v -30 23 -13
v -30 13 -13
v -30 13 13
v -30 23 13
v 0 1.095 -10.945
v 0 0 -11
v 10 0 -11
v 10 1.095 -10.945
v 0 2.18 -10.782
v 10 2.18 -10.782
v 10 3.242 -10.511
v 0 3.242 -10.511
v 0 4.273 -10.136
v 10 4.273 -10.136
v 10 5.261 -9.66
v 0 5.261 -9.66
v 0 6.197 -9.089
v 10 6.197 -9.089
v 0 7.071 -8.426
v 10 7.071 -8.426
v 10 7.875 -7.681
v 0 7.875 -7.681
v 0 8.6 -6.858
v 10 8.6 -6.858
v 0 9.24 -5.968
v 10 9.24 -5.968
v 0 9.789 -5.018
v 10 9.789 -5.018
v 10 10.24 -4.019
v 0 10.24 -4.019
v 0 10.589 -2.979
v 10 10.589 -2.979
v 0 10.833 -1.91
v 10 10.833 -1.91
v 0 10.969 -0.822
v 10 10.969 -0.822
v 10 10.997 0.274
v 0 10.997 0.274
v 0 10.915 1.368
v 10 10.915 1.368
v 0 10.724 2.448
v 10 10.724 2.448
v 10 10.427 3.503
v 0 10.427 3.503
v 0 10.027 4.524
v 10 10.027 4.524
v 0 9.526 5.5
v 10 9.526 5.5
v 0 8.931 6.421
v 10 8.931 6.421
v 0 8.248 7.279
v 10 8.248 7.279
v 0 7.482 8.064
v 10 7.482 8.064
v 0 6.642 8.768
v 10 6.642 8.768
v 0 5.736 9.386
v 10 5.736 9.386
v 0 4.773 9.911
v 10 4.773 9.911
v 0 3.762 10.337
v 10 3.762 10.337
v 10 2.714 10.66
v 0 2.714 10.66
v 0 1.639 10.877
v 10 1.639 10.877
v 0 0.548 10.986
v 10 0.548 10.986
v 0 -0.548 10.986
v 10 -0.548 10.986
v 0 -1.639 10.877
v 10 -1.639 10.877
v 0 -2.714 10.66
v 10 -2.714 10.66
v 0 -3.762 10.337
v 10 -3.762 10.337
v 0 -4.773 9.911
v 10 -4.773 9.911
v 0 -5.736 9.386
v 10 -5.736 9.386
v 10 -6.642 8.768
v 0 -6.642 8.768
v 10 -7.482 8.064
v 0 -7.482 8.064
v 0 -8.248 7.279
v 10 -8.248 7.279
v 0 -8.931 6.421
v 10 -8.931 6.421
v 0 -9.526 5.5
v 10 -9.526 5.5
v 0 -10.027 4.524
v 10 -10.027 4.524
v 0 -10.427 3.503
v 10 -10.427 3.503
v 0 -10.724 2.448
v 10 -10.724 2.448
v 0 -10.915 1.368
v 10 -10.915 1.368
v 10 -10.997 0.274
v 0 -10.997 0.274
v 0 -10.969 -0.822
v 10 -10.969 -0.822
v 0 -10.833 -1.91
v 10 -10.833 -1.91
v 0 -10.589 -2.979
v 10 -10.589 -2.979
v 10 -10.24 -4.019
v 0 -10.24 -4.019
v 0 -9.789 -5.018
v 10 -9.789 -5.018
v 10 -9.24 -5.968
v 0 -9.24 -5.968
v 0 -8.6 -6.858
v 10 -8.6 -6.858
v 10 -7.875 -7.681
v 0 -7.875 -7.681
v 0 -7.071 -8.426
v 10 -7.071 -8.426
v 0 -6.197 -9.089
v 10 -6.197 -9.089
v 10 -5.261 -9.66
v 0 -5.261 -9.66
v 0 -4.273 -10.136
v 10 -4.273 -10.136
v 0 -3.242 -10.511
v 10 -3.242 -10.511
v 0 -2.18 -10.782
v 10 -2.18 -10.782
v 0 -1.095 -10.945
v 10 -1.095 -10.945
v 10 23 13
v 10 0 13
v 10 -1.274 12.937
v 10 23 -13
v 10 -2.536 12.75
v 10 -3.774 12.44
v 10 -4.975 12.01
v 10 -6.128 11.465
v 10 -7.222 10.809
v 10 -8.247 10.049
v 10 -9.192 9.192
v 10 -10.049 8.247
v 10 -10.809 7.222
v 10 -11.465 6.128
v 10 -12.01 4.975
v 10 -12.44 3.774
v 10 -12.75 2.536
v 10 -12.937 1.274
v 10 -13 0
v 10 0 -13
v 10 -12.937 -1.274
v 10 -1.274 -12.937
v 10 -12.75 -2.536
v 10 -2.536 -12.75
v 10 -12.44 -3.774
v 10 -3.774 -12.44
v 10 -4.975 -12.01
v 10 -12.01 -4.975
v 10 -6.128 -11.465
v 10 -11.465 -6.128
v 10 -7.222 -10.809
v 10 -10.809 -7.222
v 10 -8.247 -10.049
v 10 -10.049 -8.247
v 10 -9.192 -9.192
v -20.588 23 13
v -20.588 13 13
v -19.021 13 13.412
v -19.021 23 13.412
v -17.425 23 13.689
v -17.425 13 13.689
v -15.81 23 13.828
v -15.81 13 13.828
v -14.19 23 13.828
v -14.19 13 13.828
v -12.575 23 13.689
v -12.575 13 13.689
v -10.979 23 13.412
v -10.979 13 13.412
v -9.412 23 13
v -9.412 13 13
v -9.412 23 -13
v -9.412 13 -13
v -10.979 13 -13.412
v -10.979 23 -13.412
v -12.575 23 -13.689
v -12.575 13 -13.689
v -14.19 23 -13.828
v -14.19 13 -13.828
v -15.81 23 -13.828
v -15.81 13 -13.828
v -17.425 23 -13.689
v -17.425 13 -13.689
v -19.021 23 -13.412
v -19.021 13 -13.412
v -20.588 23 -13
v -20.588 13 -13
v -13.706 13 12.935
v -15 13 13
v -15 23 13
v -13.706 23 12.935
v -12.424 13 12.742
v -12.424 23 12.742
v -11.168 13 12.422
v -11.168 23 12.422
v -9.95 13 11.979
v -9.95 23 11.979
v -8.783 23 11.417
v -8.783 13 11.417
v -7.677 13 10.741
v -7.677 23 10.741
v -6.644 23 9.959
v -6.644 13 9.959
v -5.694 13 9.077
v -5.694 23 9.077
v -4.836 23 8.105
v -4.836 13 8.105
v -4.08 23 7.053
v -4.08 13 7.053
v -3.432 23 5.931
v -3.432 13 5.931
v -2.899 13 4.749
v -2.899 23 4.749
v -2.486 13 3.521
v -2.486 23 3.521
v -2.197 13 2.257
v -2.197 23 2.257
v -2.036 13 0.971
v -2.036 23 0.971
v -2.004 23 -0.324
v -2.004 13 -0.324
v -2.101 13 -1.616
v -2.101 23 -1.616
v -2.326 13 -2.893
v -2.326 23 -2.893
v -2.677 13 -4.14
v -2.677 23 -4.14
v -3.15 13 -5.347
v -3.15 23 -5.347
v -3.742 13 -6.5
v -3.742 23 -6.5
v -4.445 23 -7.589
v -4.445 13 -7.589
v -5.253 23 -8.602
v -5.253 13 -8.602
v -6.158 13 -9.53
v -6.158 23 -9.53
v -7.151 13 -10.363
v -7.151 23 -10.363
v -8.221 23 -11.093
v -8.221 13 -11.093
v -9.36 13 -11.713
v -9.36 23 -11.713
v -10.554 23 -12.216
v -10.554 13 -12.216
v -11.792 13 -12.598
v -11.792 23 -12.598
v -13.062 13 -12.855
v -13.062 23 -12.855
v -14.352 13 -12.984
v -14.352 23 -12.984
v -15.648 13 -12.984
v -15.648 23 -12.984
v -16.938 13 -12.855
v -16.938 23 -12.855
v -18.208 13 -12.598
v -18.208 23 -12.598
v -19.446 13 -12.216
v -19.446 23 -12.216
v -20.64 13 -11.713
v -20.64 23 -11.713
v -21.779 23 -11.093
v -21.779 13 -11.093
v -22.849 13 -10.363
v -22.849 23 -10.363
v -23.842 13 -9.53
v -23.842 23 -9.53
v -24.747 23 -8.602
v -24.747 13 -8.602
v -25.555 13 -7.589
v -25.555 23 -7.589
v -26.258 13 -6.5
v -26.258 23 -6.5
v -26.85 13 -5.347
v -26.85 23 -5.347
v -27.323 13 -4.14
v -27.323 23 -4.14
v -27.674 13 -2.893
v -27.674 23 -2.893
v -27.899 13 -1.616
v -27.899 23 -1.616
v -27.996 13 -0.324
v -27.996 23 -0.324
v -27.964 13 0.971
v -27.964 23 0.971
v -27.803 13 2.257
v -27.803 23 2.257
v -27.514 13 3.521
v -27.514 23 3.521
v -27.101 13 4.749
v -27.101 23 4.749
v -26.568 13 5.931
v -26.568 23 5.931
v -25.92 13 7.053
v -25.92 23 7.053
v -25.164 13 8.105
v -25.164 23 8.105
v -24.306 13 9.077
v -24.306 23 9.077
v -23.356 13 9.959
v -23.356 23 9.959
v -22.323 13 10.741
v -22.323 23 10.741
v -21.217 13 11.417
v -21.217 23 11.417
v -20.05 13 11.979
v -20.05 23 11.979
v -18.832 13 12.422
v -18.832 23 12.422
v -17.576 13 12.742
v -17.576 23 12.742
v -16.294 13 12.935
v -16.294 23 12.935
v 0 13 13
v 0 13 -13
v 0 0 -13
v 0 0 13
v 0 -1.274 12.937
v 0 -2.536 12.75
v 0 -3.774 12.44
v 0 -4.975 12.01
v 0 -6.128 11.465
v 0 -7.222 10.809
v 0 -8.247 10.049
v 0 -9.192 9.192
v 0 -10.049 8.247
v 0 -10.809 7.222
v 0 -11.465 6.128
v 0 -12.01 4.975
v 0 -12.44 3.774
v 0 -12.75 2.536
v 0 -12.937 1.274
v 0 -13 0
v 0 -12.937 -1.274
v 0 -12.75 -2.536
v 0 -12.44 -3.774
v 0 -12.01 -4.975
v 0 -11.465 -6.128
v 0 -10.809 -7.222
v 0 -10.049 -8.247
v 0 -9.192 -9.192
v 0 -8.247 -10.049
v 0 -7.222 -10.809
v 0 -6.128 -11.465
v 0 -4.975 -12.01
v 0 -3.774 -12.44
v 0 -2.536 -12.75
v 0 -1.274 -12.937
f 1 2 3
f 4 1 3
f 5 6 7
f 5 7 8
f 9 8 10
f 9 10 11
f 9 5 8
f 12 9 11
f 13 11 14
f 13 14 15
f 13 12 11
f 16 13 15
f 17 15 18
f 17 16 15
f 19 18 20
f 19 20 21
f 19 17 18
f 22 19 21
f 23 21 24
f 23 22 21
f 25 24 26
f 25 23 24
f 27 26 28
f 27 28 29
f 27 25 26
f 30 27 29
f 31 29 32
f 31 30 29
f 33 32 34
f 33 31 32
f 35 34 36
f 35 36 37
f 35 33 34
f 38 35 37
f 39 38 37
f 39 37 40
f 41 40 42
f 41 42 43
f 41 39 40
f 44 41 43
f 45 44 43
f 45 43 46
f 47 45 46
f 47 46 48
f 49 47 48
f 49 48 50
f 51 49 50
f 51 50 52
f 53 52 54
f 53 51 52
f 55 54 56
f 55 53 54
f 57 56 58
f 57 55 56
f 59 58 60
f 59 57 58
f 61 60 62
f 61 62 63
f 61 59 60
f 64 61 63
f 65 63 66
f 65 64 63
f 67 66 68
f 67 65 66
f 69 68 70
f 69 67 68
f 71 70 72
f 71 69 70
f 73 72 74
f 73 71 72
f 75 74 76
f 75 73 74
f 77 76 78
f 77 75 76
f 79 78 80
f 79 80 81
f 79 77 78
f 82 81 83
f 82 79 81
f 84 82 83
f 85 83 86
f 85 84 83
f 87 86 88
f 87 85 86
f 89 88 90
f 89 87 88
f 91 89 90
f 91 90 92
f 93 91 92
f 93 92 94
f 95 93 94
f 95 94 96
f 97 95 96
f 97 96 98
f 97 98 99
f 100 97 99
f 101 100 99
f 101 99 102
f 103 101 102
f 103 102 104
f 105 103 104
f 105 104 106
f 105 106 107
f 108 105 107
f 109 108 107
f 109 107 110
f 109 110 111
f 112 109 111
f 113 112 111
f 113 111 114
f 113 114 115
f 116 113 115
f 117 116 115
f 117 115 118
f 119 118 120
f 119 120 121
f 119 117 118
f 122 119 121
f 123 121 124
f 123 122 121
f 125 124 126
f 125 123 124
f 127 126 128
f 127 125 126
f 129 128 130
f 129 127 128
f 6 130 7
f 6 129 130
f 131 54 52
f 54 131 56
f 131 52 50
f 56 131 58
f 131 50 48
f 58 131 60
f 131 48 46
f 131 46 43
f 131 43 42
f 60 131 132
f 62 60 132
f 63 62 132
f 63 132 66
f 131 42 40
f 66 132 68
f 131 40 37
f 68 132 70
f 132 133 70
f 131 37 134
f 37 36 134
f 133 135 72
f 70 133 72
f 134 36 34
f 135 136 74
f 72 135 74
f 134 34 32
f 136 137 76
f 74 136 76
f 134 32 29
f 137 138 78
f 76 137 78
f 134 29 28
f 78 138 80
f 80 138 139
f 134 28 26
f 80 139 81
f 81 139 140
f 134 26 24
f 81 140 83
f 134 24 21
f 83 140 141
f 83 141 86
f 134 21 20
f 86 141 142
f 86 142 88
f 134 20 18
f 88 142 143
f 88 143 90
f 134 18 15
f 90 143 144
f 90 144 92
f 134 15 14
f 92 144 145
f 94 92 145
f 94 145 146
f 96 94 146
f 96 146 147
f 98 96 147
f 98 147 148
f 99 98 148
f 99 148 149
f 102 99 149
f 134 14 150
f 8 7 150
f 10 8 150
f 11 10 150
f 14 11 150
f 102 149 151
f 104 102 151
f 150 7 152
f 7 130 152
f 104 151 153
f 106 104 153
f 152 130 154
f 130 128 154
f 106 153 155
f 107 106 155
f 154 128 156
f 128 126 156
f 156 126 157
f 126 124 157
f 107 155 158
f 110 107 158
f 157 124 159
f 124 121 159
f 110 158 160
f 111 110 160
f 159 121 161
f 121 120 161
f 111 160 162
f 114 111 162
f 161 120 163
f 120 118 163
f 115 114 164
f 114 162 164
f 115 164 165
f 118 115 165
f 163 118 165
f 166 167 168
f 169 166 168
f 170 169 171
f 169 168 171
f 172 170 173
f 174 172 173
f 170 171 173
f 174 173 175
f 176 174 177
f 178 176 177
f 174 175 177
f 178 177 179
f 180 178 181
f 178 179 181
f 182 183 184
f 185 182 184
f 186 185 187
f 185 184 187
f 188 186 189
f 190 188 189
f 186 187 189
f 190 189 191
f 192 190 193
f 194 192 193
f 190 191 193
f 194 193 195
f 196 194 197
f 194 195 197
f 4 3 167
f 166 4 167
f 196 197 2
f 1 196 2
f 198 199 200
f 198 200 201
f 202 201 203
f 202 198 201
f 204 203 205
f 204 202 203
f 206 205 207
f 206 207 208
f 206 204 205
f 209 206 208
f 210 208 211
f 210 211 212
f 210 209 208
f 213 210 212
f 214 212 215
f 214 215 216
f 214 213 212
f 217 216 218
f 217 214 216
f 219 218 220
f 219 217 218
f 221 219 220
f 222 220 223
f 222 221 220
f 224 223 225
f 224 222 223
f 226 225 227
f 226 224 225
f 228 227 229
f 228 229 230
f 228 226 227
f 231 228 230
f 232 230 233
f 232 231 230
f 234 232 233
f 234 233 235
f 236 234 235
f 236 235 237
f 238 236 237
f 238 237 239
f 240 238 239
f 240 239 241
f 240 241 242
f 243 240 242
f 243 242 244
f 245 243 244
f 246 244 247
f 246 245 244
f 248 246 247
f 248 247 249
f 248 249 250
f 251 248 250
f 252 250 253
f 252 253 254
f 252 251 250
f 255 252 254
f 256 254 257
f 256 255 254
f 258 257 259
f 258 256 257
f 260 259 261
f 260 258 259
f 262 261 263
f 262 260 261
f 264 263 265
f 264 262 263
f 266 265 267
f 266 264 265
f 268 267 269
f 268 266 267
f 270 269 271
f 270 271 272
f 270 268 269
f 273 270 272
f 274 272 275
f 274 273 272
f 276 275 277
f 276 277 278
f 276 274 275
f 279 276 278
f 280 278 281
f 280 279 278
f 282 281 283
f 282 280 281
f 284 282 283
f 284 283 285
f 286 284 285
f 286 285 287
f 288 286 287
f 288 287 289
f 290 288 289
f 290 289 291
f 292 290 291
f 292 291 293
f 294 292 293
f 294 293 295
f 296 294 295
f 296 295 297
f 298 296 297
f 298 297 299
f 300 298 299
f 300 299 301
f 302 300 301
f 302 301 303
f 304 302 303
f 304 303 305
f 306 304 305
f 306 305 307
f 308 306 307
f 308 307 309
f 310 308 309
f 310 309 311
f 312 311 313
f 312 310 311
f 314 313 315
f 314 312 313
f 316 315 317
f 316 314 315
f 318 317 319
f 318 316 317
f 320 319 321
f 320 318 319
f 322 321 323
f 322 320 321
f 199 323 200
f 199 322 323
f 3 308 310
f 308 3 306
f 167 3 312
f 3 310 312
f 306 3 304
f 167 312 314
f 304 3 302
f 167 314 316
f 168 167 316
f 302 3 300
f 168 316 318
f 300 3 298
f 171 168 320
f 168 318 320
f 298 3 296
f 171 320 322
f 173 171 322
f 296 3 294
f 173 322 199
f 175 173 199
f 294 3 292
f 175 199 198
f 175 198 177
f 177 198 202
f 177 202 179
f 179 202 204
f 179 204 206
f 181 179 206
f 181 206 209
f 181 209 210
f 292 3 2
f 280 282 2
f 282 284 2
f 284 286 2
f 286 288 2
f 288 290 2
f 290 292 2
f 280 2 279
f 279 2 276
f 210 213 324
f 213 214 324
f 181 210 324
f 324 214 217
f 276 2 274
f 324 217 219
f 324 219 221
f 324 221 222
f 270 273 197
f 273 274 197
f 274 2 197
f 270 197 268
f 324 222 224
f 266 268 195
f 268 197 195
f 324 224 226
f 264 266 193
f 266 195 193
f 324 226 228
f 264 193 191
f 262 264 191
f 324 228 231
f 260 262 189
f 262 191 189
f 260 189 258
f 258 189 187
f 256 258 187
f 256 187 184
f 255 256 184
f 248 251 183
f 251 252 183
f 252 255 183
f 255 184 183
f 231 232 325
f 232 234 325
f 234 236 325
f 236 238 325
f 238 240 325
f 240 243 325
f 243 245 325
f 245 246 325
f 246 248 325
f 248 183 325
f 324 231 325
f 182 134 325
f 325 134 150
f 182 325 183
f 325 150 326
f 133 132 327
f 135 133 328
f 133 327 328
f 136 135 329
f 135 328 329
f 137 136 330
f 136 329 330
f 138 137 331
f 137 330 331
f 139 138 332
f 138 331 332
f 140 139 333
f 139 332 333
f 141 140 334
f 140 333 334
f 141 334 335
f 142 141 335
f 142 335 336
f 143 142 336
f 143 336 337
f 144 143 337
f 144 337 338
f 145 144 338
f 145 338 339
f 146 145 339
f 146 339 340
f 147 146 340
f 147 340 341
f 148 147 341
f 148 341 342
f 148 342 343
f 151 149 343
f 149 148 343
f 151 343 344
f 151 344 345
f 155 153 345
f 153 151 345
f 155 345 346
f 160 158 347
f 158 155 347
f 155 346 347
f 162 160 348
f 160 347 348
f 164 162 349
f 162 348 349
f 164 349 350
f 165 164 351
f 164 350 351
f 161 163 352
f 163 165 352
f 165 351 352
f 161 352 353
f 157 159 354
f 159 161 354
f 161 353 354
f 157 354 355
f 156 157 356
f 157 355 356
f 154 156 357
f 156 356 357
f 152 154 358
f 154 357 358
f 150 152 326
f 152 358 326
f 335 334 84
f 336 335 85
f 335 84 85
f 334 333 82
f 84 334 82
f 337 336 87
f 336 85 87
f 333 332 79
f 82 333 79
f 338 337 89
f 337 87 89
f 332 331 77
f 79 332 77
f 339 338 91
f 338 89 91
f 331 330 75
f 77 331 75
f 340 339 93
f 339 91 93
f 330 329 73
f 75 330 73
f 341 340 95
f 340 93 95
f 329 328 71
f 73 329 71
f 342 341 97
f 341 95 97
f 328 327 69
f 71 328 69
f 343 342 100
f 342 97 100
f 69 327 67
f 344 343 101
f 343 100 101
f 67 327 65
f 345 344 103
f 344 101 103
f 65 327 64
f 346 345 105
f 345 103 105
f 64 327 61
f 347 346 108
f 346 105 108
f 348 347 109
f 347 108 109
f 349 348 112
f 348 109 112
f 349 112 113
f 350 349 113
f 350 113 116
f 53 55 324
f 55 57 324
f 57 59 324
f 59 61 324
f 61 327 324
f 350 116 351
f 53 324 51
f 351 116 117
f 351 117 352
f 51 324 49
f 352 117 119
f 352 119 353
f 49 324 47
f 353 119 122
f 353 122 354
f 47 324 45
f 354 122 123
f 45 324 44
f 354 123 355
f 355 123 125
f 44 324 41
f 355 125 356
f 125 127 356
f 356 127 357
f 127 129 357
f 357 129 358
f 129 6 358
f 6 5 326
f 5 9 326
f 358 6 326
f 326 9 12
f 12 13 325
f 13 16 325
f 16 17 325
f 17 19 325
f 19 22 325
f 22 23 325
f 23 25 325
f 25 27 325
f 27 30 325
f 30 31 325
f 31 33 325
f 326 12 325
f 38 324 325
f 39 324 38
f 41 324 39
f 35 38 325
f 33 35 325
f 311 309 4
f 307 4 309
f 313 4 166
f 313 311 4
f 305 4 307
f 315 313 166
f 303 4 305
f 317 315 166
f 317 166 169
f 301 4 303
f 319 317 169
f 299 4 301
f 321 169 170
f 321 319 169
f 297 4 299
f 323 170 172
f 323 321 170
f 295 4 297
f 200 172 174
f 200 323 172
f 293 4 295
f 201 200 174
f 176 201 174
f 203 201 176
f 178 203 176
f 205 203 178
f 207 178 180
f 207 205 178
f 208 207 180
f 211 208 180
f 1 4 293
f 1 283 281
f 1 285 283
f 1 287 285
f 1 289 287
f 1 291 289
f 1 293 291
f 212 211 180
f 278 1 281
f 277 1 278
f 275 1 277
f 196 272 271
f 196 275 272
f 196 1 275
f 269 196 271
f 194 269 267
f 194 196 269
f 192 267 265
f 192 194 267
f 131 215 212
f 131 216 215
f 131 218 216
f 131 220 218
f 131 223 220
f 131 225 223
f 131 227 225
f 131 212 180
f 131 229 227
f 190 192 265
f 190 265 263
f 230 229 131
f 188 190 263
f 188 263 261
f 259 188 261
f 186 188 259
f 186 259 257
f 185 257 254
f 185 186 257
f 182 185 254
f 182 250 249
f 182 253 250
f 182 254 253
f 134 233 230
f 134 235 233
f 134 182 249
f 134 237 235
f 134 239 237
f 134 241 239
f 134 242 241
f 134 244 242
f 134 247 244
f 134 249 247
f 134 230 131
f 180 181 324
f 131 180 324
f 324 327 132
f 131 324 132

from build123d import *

# Parameters (mm, degrees)
SKETCH1_R                = 13
SKETCH1_R_2              = 11
BOSS_EXTRUDE1_DEPTH      = 10
BOSS_EXTRUDE2_REACH      = 32.741
BOSS_EXTRUDE2_END_RADIUS = 13
SKETCH2_W                = 10
SKETCH2_H                = 26
SKETCH2_3_R              = 13
BOSS_EXTRUDE3_DEPTH      = 10


with BuildPart() as part:
    # Sketch1 → Boss-Extrude1 (new body)
    with BuildSketch(Plane(origin=(0, 0, 0), x_dir=(0, 0, -1), z_dir=(1, 0, 0))):
        Circle(SKETCH1_R)
        Circle(SKETCH1_R_2, mode=Mode.SUBTRACT)
    extrude(amount=BOSS_EXTRUDE1_DEPTH)

    # Boss-Extrude2: up to this cylinder (the profile starts outside it)
    boss_extrude2_end = Plane(origin=(5, 0, 0), z_dir=(-1, 0, 0)) * Cylinder(BOSS_EXTRUDE2_END_RADIUS, 92.482, mode=Mode.PRIVATE)
    # Sketch2 → Boss-Extrude2 (add, up to the surface)
    with BuildSketch(Plane(origin=(0, 13, 0), x_dir=(1, 0, 0), z_dir=(0, 1, 0)), mode=Mode.PRIVATE) as boss_extrude2_sk1:
        with Locations((5, 0)):
            Rectangle(SKETCH2_W, SKETCH2_H)
    boss_extrude2_tool1 = extrude(boss_extrude2_sk1.sketch, amount=-BOSS_EXTRUDE2_REACH, mode=Mode.PRIVATE) - boss_extrude2_end
    add(boss_extrude2_tool1.solids().sort_by_distance((5, 13, 0))[0])
    add(boss_extrude2_tool1.solids().sort_by_distance((5, 13, 0))[1])

    # Sketch2<3> → Boss-Extrude3 (add)
    with BuildSketch(Plane(origin=(0, 13, 0), x_dir=(1, 0, 0), z_dir=(0, 1, 0))):
        with BuildLine():
            Line((10, -13), (10, 13))
            Line((10, 13), (-9.411981237, 13))
            ThreePointArc((-9.411981237, 13), (-15, 13.845319391), (-20.588018763, 13))
            Line((-20.588018763, 13), (-30, 13))
            Line((-30, 13), (-30, -13))
            Line((-30, -13), (-20.588018763, -13))
            ThreePointArc((-20.588018763, -13), (-15, -13.845319391), (-9.411981237, -13))
            Line((-9.411981237, -13), (10, -13))
        make_face()
        with Locations((-15, 0)):
            Circle(SKETCH2_3_R, mode=Mode.SUBTRACT)
    extrude(amount=BOSS_EXTRUDE3_DEPTH)


solid = part.part
